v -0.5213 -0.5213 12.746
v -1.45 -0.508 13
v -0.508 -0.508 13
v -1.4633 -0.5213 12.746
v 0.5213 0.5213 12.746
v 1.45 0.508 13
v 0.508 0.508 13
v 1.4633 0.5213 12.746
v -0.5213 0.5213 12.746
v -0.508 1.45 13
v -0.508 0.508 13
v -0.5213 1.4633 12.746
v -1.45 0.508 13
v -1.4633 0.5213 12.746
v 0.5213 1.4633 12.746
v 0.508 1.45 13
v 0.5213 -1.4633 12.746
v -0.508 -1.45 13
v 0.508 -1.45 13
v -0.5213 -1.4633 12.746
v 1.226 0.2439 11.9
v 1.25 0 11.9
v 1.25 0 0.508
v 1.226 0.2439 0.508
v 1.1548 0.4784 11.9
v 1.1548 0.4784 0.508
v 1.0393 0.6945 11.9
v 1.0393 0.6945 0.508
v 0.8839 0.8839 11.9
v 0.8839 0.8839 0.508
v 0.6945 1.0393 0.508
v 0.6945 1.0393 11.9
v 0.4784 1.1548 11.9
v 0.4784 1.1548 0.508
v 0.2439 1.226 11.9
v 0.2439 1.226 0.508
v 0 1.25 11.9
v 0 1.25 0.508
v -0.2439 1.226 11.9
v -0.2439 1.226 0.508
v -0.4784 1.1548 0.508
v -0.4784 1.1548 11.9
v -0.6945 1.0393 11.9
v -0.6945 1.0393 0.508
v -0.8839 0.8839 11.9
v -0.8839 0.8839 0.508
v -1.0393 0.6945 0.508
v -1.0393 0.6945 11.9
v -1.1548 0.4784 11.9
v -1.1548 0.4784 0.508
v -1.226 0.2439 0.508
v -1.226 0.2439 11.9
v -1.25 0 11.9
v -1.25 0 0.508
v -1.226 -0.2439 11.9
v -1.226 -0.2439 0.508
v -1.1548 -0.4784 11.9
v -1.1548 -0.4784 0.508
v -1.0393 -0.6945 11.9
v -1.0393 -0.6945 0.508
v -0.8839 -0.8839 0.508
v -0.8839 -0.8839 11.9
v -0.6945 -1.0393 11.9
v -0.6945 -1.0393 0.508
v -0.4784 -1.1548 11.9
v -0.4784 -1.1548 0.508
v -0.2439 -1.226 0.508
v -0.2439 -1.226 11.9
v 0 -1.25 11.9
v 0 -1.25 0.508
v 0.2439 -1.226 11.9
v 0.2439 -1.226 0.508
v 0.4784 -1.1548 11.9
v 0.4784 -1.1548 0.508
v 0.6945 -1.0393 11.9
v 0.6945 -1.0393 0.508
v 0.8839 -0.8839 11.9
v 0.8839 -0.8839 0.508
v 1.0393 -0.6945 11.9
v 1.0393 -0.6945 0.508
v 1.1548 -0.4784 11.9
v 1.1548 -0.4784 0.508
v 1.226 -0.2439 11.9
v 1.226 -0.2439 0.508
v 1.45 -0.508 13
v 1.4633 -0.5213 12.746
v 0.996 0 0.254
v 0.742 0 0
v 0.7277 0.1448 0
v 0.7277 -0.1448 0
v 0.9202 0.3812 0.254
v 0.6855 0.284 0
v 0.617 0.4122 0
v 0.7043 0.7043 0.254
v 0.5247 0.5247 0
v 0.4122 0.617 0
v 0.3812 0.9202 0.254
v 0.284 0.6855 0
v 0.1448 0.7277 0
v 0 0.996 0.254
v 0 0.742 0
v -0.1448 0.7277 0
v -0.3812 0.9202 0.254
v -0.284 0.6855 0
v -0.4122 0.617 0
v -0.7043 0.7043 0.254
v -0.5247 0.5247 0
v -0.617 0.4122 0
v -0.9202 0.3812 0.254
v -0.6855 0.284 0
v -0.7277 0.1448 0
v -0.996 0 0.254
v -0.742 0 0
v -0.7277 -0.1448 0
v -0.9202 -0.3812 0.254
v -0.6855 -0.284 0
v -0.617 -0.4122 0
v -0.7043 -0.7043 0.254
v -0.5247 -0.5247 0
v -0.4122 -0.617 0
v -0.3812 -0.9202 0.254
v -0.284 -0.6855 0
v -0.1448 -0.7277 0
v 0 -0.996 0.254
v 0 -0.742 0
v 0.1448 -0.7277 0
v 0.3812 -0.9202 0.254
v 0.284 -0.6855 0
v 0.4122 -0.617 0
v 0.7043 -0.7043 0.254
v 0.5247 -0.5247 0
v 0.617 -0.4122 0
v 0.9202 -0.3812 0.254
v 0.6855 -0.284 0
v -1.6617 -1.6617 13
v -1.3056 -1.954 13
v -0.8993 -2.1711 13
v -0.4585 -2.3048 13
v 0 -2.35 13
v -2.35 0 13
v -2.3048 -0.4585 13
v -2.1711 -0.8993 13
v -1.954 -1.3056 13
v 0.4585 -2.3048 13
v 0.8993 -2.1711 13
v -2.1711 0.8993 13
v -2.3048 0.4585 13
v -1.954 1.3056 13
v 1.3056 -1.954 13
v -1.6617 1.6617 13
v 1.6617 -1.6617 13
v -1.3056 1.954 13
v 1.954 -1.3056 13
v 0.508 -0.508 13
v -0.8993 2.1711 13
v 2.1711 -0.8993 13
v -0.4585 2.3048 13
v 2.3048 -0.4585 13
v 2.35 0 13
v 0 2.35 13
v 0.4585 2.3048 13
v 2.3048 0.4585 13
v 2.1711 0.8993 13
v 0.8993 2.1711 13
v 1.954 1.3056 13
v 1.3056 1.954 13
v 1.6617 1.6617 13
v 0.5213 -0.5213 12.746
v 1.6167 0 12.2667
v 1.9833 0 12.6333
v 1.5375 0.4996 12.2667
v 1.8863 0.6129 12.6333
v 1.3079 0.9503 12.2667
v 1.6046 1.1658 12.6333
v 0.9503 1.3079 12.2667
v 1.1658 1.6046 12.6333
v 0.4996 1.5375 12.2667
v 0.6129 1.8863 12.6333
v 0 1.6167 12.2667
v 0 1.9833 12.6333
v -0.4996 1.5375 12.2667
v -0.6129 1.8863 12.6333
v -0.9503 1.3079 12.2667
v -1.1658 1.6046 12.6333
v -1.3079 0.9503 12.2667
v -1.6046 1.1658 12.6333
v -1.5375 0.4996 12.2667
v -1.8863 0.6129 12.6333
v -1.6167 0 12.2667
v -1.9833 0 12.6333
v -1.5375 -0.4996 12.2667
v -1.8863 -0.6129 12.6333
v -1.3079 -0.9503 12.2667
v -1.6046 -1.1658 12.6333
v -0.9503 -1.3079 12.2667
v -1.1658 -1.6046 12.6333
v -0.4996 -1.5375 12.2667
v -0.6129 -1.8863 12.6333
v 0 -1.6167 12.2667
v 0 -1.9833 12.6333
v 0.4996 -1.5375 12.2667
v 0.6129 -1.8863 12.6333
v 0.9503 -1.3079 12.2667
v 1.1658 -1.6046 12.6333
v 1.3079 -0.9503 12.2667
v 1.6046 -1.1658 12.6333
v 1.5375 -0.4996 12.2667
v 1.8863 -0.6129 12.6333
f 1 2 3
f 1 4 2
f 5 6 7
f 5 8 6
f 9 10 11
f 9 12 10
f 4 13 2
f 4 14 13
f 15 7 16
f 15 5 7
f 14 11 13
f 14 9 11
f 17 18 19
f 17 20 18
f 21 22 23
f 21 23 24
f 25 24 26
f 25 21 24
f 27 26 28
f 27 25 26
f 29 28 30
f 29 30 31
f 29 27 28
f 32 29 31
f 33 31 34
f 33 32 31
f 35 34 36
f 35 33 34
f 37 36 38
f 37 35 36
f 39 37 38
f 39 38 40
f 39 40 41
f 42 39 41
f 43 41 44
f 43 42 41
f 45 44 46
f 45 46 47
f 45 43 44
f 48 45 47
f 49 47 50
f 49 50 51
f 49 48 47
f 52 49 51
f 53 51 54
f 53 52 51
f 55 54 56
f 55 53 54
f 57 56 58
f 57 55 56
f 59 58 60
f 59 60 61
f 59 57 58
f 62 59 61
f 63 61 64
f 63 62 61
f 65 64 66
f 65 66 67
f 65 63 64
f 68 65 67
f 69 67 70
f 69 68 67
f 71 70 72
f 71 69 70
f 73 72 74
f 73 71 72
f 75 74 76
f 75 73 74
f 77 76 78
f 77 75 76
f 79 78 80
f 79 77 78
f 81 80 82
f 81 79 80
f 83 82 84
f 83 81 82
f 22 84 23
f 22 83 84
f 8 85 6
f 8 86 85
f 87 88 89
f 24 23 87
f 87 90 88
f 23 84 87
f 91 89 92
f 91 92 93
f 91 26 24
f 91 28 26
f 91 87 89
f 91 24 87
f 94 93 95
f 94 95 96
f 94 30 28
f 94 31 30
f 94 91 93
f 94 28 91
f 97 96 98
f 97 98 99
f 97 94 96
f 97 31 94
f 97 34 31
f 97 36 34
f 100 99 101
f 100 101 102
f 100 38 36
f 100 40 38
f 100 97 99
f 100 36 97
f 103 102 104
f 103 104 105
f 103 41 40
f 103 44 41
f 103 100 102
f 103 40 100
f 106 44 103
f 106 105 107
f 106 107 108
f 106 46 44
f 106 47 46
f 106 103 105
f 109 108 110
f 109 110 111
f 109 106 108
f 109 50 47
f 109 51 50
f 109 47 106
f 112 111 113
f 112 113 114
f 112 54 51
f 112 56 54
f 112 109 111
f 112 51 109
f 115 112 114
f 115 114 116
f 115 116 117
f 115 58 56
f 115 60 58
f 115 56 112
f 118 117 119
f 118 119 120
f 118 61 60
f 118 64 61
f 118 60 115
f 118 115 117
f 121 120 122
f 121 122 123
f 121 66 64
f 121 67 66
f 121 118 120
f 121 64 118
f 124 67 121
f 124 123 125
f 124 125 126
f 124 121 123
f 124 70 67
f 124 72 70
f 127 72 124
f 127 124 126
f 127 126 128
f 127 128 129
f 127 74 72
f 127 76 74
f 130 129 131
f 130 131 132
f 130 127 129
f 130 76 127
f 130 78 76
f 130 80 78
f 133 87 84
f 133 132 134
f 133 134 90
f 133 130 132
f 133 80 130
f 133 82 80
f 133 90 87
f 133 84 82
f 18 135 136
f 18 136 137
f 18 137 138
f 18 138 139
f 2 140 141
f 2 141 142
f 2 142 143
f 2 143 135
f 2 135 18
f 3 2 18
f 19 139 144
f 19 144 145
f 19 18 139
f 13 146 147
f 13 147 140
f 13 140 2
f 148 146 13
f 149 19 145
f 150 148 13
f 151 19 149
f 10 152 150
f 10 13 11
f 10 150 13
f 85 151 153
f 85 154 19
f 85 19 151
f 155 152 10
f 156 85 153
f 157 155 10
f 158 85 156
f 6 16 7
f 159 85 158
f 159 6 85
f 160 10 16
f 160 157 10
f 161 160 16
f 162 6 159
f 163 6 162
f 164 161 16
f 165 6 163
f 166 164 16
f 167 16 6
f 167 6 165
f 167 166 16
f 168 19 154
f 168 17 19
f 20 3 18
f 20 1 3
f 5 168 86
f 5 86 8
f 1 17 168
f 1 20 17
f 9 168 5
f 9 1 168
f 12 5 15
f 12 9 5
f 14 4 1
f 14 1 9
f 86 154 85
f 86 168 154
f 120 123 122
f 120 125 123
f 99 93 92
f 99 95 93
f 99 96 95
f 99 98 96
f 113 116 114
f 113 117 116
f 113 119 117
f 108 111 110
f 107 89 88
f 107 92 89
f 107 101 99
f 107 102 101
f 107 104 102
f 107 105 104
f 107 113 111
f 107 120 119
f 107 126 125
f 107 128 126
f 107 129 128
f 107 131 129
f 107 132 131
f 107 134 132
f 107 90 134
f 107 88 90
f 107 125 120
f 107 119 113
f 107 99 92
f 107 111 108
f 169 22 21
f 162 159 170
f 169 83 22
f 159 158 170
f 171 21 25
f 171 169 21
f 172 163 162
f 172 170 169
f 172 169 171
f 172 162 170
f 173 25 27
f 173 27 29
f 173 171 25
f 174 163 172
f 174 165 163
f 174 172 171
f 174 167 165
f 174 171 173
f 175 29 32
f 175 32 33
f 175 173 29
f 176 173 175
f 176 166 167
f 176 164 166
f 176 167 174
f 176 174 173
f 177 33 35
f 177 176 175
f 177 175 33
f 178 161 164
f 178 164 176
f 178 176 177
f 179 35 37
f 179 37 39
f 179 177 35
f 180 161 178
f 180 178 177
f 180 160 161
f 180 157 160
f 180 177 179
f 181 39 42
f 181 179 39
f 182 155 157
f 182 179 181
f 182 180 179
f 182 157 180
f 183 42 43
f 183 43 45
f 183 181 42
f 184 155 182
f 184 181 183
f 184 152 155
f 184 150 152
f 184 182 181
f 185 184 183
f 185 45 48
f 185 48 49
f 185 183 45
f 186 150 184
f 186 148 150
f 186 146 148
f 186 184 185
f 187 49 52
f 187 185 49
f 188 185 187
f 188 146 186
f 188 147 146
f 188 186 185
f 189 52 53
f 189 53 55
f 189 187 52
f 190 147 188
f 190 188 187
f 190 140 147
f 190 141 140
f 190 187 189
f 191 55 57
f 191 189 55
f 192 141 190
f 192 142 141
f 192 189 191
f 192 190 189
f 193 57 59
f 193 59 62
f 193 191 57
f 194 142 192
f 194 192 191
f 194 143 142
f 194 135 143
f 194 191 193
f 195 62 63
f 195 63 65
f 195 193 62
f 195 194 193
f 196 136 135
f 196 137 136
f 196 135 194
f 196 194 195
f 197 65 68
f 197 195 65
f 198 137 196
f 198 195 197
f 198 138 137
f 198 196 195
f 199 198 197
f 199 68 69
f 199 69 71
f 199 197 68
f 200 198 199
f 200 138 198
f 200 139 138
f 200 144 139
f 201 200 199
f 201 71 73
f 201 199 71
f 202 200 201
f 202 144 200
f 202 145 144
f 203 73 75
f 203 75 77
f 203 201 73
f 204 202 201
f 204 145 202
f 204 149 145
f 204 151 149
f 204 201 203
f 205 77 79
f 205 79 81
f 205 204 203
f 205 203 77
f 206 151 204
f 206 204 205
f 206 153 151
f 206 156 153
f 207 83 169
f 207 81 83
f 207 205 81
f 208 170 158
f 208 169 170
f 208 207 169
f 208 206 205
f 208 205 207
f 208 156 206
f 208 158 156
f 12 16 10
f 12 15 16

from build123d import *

# Parameters (mm, degrees)
F2_W     = 0.508
F2_H     = 0.942
F2_W_2   = 0.942
F2_H_2   = 0.508
F3_DEPTH = 0.254
F3_TAPER = -3
F4_SIZE  = 0.508


with BuildPart() as f1:
    # F0 (on Front) → F1 (revolve)
    with BuildSketch(Plane.XZ):
        Polygon((0, 13), (0, 0), (1.25, 0), (1.25, 11.9), (2.35, 13), align=None)
    revolve(axis=Axis((0, 0, 6.5), (0, 0, 1)))

    # F2 (on face) → F3 (cut)
    with BuildSketch(Plane.XY.offset(13)):
        Polygon((-0.508, 0.1779751724), (-1.45, 0.508), (-1.45, 0), (-0.508, 0), align=None)
        Polygon((-0.508, 0.508), (-1.45, 0.508), (-0.508, 0.1779751724), align=None)
        with Locations((-0.254, 0.979)):
            Rectangle(F2_W, F2_H)
        Polygon((0, 0.508), (-0.508, 0.508), (-0.508, 0.1779751724), (0, 0), align=None)
        with Locations((-0.979, -0.254)):
            Rectangle(F2_W_2, F2_H_2)
        Polygon((0, 1.45), (0, 0.508), (0.1779751724, 0.508), (0.508, 1.45), align=None)
        Polygon((0, 0), (-0.508, 0), (-0.508, -0.508), (-0.1779751724, -0.508), align=None)
        Polygon((0.508, -0.1779751724), (0, 0), (0, -0.508), (0.508, -0.508), align=None)
        Polygon((0.1779751724, 0.508), (0, 0), (0.508, 0), (0.508, 0.508), align=None)
        Polygon((0.508, 1.45), (0.1779751724, 0.508), (0.508, 0.508), align=None)
        Polygon((-0.1779751724, -0.508), (-0.508, -0.508), (-0.508, -1.45), align=None)
        Polygon((0, -1.45), (0, -0.508), (-0.1779751724, -0.508), (-0.508, -1.45), align=None)
        with Locations((0.254, -0.979)):
            Rectangle(F2_W, F2_H)
        Polygon((1.45, 0), (0.508, 0), (0.508, -0.1779751724), (1.45, -0.508), align=None)
        with Locations((0.979, 0.254)):
            Rectangle(F2_W_2, F2_H_2)
        Polygon((1.45, -0.508), (0.508, -0.1779751724), (0.508, -0.508), align=None)
        Polygon((0.1779751724, 0.508), (0, 0.508), (0, 0), align=None)
        Polygon((0.508, 0), (0, 0), (0.508, -0.1779751724), align=None)
        Polygon((0, -0.508), (0, 0), (-0.1779751724, -0.508), align=None)
        Polygon((0, 0), (-0.508, 0.1779751724), (-0.508, 0), align=None)
    extrude(amount=-F3_DEPTH, taper=F3_TAPER, mode=Mode.SUBTRACT)

    # F4
    f4_edges = [f1.edges().sort_by_distance(p)[0] for p in [
        (-1.25, 0, 0),
    ]]
    chamfer(f4_edges, length=F4_SIZE)


solid = f1.part
